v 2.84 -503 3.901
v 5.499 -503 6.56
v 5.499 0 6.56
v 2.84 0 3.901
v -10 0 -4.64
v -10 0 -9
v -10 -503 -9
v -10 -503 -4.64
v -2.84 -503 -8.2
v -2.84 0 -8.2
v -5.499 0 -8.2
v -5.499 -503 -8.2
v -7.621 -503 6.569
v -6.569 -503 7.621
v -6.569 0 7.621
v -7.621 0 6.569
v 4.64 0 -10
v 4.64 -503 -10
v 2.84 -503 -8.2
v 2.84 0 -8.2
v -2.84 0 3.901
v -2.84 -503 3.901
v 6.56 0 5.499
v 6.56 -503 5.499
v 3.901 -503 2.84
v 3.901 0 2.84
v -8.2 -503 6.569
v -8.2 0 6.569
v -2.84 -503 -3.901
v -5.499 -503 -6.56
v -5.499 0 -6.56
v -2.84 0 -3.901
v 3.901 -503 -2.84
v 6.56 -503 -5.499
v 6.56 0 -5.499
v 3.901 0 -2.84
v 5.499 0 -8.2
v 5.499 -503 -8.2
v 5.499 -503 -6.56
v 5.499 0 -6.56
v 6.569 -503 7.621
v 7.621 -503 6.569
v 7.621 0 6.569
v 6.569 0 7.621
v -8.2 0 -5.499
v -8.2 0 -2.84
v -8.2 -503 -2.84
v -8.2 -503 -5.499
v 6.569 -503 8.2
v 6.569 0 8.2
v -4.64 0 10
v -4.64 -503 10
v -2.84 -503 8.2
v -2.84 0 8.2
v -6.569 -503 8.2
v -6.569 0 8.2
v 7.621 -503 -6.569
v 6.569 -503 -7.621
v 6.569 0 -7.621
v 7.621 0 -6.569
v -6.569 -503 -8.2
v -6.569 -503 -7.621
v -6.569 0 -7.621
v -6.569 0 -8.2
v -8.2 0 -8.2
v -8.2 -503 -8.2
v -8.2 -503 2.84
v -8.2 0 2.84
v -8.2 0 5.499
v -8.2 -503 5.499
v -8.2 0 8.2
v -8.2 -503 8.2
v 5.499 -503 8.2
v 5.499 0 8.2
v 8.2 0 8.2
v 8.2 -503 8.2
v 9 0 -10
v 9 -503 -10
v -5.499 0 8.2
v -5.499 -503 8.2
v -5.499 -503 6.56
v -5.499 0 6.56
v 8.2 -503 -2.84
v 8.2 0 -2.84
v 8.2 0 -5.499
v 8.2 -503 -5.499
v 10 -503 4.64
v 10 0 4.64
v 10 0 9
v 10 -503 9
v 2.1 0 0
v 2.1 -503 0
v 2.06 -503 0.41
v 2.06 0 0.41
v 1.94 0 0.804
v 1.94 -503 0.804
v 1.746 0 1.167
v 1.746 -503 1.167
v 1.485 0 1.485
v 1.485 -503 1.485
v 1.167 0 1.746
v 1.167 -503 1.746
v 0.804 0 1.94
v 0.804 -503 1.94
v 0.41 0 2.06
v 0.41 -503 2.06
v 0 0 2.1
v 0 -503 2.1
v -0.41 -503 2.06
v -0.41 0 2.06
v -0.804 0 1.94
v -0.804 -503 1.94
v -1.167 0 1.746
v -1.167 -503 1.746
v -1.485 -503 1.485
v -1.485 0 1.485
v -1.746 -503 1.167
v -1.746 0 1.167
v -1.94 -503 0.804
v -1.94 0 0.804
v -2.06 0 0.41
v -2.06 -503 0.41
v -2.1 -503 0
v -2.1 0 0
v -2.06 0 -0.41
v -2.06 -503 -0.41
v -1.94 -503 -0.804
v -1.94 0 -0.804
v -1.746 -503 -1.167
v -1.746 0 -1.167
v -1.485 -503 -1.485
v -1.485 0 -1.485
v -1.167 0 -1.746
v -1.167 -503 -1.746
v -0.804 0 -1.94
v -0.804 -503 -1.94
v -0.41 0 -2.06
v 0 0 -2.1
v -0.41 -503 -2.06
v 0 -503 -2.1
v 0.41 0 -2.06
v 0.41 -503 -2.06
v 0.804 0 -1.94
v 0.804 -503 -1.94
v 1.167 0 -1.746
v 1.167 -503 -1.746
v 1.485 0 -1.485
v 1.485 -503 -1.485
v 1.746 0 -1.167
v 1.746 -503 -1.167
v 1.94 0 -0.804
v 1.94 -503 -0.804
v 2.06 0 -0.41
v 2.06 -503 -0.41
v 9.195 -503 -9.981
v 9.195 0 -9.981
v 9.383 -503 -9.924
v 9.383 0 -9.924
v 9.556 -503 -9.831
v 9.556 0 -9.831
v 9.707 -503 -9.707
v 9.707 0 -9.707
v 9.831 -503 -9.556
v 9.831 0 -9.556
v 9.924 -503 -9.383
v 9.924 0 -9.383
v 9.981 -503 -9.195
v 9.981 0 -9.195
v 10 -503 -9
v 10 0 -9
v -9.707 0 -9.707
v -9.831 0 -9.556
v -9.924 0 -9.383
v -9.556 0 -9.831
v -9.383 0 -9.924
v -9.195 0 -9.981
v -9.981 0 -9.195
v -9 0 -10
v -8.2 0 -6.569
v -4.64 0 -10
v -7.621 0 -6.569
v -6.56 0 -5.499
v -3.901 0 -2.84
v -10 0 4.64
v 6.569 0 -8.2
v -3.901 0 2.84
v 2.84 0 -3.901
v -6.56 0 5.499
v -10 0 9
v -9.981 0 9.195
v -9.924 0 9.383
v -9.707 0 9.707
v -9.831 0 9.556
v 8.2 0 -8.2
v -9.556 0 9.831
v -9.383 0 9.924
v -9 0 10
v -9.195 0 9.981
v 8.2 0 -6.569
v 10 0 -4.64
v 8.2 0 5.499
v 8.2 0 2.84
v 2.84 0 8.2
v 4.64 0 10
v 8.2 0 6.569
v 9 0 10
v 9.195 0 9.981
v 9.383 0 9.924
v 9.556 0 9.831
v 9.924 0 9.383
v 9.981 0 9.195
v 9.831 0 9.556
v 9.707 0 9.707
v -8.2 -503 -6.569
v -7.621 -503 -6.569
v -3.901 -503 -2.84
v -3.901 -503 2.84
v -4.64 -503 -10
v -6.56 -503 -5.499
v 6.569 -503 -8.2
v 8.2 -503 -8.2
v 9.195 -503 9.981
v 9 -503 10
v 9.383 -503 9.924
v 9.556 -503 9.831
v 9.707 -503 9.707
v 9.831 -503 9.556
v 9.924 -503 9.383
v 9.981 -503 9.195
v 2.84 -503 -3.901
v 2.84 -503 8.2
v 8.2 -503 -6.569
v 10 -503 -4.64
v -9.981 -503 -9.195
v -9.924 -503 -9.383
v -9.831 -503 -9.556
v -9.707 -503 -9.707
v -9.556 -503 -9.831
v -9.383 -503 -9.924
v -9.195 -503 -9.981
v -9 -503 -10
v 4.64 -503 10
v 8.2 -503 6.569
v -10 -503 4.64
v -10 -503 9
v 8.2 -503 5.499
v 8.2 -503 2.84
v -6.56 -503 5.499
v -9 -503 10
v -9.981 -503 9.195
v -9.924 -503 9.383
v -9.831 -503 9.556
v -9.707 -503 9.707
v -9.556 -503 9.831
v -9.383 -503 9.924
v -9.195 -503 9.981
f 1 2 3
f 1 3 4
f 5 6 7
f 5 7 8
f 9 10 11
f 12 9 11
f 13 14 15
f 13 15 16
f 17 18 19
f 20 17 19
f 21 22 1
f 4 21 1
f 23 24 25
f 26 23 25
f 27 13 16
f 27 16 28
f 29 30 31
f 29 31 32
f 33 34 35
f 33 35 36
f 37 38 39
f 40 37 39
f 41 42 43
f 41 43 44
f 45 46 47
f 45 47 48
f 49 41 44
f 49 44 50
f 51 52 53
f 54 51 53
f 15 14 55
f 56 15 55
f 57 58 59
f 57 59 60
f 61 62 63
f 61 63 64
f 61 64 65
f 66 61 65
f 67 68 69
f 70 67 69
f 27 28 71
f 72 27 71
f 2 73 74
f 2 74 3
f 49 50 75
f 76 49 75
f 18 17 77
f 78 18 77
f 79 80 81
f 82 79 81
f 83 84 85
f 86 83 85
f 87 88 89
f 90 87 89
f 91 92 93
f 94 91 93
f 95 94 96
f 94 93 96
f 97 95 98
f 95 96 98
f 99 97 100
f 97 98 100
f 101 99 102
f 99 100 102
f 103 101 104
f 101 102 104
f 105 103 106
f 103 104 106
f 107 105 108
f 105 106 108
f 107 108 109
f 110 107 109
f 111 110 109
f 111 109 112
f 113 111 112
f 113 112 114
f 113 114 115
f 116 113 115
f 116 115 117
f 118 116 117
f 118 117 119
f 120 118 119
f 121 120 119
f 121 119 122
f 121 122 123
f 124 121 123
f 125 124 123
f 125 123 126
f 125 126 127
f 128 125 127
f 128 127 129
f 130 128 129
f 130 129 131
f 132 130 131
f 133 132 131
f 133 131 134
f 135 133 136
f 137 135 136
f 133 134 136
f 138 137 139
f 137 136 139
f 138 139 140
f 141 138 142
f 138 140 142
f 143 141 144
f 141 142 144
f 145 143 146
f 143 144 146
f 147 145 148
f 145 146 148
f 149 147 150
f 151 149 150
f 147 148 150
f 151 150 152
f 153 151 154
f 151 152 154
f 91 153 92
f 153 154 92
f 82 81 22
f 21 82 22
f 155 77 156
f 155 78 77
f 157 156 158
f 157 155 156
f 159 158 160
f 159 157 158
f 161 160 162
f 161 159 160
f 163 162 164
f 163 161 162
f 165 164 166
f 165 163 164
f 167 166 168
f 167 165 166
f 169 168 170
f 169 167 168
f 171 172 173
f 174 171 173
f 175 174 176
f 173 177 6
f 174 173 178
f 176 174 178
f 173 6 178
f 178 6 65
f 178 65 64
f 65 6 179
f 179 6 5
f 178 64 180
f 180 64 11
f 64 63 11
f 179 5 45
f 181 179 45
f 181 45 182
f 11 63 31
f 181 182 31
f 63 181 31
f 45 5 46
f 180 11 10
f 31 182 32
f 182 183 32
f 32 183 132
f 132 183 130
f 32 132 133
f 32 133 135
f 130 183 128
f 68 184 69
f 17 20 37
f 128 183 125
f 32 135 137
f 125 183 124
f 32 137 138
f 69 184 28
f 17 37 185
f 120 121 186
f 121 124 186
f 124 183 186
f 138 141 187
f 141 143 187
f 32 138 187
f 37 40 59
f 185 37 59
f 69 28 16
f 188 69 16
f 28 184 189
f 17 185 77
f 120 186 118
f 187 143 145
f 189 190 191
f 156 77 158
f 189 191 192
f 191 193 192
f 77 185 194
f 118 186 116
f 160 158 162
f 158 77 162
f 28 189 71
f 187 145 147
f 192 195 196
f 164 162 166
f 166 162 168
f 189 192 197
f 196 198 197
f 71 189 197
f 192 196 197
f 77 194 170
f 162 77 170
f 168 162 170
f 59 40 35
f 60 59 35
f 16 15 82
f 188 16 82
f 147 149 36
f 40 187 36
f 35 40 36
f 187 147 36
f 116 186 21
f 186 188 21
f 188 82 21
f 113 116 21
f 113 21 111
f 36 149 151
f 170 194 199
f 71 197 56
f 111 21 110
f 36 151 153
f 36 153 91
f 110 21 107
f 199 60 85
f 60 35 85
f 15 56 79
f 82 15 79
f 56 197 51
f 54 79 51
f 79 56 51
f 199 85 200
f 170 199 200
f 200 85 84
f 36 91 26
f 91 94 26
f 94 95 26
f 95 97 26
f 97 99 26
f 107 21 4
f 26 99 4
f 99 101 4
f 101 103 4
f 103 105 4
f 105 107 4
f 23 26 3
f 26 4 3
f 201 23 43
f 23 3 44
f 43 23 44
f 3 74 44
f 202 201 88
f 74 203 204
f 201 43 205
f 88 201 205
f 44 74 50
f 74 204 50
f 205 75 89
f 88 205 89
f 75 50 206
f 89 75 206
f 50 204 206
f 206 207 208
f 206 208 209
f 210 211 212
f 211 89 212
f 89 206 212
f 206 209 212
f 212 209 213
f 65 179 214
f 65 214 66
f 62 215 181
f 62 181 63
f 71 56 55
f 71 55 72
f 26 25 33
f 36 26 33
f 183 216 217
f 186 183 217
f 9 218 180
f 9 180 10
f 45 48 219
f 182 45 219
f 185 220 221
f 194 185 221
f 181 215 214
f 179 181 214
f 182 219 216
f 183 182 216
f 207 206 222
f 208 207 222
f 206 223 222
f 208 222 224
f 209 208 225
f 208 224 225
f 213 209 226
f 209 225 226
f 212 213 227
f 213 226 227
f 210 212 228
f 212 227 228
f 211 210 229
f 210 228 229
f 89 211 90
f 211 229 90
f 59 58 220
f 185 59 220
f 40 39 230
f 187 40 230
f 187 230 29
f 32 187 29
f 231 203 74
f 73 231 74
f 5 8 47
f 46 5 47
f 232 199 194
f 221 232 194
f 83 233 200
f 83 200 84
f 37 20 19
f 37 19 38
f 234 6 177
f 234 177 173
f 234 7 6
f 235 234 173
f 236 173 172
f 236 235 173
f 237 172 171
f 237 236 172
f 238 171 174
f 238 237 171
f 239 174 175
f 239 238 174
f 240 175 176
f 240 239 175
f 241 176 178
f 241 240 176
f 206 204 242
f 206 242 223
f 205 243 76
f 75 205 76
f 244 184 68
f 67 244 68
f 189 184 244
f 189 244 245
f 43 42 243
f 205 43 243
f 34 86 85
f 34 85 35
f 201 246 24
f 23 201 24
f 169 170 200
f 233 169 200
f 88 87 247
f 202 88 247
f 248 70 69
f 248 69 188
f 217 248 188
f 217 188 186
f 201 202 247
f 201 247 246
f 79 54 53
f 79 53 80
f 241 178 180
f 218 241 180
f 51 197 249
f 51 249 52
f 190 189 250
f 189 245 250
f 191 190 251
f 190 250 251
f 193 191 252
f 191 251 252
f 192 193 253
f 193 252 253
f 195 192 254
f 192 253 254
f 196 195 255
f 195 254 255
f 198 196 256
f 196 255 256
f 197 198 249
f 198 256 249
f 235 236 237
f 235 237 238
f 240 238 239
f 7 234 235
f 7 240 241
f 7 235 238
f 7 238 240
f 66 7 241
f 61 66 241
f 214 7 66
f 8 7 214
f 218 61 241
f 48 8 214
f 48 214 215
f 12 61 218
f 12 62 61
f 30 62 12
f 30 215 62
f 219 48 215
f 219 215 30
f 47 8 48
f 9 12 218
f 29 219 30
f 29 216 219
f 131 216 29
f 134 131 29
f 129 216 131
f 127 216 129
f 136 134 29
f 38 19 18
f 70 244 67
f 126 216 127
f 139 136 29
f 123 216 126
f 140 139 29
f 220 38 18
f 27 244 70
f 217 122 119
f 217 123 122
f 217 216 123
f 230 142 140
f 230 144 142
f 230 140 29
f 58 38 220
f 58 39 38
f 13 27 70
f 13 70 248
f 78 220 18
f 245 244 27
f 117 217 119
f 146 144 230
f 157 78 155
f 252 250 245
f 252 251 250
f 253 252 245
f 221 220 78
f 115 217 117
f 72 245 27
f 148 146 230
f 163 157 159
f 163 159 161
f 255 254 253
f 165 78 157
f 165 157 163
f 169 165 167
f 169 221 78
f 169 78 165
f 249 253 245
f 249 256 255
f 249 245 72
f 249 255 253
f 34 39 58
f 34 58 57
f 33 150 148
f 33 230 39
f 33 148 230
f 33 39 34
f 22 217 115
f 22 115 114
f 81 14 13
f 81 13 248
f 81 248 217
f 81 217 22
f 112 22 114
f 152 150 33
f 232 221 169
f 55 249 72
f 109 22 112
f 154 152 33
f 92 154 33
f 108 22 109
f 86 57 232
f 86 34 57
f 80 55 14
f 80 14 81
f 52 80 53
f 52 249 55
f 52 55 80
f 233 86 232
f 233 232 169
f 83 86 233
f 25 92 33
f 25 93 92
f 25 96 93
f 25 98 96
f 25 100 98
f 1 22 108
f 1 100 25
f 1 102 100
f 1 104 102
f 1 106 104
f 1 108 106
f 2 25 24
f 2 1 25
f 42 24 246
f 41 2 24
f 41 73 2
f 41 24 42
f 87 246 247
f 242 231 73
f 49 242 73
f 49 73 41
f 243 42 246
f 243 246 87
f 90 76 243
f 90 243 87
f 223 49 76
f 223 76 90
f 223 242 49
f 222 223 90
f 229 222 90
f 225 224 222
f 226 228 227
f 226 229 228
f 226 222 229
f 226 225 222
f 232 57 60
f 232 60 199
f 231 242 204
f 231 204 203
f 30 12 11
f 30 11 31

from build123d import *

# Parameters (mm, degrees)
F0_W            = 20
F0_H            = 20
F1_DEPTH        = 503
F2_R            = 2.1
F3_DEPTH        = 503.001
F4_R            = 1
F6_DEPTH        = 503.001
F6_COPIES_COUNT = 4


# Not quite as in the source:
# - a pattern or mirror of a feature is missing from the dataset's text; its kind, count and spacing are read off the source's solid


with BuildPart() as f1:
    # F0 (on Front) → F1 (new body)
    with BuildSketch(Plane.XZ):
        Rectangle(F0_W, F0_H)
    extrude(amount=F1_DEPTH)

    # F2 (on face) → F3 (cut, through all)
    with BuildSketch(Plane.XZ.offset(503)):
        Circle(F2_R)
    extrude(amount=-F3_DEPTH, mode=Mode.SUBTRACT)

    # F4
    f4_edges = [f1.edges().sort_by_distance(p)[0] for p in [
        (-10, -251.5, 10),
        (10, -251.5, 10),
        (10, -251.5, -10),
        (-10, -251.5, -10),
    ]]
    fillet(f4_edges, radius=F4_R)

    # F5 (on face) → F6 (cut, through all)
    with BuildSketch(Plane.XZ.offset(503)):
        Polygon((0, 3.9006601718), (0, 10), (-2.84, 10), (-4.64, 10), (-2.84, 8.2), (-5.4993398282, 8.2), (-5.4993398282, 6.56), (-2.84, 3.9006601718), align=None)
        Polygon((-6.5693398282, 8.2), (-8.2, 8.2), (-7.0953059148, 7.0953059148), (-6.5693398282, 7.6212720014), align=None)
    f6 = extrude(amount=-F6_DEPTH, mode=Mode.SUBTRACT)

    # F6_copies: F6 ×4 about axis
    f6_copies_axis = Axis((0, 0, 0), (0, 1, 0))
    for i in range(1, F6_COPIES_COUNT):
        add(f6.rotate(f6_copies_axis, i * 360 / F6_COPIES_COUNT), mode=Mode.SUBTRACT)

    # F6_copies1: F6 across plane
    add(f6.mirror(Plane(origin=(0, 0, 0), x_dir=(-0.7071067812, 0, -0.7071067812), z_dir=(0.7071067812, 0, -0.7071067812))), mode=Mode.SUBTRACT)

    # F6_copies2: F6 across plane
    add(f6.mirror(Plane(origin=(0, 0, 0), x_dir=(-1, 0, 0), z_dir=(0, 0, -1))), mode=Mode.SUBTRACT)

    # F6_copies3: F6 across plane
    add(f6.mirror(Plane(origin=(0, 0, 0), x_dir=(0, 0, 1), z_dir=(1, 0, 0))), mode=Mode.SUBTRACT)

    # F6_copies4: F6 across plane
    add(f6.mirror(Plane(origin=(0, 0, 0), x_dir=(0.7071067812, 0, -0.7071067812), z_dir=(-0.7071067812, 0, -0.7071067812))), mode=Mode.SUBTRACT)


solid = f1.part
